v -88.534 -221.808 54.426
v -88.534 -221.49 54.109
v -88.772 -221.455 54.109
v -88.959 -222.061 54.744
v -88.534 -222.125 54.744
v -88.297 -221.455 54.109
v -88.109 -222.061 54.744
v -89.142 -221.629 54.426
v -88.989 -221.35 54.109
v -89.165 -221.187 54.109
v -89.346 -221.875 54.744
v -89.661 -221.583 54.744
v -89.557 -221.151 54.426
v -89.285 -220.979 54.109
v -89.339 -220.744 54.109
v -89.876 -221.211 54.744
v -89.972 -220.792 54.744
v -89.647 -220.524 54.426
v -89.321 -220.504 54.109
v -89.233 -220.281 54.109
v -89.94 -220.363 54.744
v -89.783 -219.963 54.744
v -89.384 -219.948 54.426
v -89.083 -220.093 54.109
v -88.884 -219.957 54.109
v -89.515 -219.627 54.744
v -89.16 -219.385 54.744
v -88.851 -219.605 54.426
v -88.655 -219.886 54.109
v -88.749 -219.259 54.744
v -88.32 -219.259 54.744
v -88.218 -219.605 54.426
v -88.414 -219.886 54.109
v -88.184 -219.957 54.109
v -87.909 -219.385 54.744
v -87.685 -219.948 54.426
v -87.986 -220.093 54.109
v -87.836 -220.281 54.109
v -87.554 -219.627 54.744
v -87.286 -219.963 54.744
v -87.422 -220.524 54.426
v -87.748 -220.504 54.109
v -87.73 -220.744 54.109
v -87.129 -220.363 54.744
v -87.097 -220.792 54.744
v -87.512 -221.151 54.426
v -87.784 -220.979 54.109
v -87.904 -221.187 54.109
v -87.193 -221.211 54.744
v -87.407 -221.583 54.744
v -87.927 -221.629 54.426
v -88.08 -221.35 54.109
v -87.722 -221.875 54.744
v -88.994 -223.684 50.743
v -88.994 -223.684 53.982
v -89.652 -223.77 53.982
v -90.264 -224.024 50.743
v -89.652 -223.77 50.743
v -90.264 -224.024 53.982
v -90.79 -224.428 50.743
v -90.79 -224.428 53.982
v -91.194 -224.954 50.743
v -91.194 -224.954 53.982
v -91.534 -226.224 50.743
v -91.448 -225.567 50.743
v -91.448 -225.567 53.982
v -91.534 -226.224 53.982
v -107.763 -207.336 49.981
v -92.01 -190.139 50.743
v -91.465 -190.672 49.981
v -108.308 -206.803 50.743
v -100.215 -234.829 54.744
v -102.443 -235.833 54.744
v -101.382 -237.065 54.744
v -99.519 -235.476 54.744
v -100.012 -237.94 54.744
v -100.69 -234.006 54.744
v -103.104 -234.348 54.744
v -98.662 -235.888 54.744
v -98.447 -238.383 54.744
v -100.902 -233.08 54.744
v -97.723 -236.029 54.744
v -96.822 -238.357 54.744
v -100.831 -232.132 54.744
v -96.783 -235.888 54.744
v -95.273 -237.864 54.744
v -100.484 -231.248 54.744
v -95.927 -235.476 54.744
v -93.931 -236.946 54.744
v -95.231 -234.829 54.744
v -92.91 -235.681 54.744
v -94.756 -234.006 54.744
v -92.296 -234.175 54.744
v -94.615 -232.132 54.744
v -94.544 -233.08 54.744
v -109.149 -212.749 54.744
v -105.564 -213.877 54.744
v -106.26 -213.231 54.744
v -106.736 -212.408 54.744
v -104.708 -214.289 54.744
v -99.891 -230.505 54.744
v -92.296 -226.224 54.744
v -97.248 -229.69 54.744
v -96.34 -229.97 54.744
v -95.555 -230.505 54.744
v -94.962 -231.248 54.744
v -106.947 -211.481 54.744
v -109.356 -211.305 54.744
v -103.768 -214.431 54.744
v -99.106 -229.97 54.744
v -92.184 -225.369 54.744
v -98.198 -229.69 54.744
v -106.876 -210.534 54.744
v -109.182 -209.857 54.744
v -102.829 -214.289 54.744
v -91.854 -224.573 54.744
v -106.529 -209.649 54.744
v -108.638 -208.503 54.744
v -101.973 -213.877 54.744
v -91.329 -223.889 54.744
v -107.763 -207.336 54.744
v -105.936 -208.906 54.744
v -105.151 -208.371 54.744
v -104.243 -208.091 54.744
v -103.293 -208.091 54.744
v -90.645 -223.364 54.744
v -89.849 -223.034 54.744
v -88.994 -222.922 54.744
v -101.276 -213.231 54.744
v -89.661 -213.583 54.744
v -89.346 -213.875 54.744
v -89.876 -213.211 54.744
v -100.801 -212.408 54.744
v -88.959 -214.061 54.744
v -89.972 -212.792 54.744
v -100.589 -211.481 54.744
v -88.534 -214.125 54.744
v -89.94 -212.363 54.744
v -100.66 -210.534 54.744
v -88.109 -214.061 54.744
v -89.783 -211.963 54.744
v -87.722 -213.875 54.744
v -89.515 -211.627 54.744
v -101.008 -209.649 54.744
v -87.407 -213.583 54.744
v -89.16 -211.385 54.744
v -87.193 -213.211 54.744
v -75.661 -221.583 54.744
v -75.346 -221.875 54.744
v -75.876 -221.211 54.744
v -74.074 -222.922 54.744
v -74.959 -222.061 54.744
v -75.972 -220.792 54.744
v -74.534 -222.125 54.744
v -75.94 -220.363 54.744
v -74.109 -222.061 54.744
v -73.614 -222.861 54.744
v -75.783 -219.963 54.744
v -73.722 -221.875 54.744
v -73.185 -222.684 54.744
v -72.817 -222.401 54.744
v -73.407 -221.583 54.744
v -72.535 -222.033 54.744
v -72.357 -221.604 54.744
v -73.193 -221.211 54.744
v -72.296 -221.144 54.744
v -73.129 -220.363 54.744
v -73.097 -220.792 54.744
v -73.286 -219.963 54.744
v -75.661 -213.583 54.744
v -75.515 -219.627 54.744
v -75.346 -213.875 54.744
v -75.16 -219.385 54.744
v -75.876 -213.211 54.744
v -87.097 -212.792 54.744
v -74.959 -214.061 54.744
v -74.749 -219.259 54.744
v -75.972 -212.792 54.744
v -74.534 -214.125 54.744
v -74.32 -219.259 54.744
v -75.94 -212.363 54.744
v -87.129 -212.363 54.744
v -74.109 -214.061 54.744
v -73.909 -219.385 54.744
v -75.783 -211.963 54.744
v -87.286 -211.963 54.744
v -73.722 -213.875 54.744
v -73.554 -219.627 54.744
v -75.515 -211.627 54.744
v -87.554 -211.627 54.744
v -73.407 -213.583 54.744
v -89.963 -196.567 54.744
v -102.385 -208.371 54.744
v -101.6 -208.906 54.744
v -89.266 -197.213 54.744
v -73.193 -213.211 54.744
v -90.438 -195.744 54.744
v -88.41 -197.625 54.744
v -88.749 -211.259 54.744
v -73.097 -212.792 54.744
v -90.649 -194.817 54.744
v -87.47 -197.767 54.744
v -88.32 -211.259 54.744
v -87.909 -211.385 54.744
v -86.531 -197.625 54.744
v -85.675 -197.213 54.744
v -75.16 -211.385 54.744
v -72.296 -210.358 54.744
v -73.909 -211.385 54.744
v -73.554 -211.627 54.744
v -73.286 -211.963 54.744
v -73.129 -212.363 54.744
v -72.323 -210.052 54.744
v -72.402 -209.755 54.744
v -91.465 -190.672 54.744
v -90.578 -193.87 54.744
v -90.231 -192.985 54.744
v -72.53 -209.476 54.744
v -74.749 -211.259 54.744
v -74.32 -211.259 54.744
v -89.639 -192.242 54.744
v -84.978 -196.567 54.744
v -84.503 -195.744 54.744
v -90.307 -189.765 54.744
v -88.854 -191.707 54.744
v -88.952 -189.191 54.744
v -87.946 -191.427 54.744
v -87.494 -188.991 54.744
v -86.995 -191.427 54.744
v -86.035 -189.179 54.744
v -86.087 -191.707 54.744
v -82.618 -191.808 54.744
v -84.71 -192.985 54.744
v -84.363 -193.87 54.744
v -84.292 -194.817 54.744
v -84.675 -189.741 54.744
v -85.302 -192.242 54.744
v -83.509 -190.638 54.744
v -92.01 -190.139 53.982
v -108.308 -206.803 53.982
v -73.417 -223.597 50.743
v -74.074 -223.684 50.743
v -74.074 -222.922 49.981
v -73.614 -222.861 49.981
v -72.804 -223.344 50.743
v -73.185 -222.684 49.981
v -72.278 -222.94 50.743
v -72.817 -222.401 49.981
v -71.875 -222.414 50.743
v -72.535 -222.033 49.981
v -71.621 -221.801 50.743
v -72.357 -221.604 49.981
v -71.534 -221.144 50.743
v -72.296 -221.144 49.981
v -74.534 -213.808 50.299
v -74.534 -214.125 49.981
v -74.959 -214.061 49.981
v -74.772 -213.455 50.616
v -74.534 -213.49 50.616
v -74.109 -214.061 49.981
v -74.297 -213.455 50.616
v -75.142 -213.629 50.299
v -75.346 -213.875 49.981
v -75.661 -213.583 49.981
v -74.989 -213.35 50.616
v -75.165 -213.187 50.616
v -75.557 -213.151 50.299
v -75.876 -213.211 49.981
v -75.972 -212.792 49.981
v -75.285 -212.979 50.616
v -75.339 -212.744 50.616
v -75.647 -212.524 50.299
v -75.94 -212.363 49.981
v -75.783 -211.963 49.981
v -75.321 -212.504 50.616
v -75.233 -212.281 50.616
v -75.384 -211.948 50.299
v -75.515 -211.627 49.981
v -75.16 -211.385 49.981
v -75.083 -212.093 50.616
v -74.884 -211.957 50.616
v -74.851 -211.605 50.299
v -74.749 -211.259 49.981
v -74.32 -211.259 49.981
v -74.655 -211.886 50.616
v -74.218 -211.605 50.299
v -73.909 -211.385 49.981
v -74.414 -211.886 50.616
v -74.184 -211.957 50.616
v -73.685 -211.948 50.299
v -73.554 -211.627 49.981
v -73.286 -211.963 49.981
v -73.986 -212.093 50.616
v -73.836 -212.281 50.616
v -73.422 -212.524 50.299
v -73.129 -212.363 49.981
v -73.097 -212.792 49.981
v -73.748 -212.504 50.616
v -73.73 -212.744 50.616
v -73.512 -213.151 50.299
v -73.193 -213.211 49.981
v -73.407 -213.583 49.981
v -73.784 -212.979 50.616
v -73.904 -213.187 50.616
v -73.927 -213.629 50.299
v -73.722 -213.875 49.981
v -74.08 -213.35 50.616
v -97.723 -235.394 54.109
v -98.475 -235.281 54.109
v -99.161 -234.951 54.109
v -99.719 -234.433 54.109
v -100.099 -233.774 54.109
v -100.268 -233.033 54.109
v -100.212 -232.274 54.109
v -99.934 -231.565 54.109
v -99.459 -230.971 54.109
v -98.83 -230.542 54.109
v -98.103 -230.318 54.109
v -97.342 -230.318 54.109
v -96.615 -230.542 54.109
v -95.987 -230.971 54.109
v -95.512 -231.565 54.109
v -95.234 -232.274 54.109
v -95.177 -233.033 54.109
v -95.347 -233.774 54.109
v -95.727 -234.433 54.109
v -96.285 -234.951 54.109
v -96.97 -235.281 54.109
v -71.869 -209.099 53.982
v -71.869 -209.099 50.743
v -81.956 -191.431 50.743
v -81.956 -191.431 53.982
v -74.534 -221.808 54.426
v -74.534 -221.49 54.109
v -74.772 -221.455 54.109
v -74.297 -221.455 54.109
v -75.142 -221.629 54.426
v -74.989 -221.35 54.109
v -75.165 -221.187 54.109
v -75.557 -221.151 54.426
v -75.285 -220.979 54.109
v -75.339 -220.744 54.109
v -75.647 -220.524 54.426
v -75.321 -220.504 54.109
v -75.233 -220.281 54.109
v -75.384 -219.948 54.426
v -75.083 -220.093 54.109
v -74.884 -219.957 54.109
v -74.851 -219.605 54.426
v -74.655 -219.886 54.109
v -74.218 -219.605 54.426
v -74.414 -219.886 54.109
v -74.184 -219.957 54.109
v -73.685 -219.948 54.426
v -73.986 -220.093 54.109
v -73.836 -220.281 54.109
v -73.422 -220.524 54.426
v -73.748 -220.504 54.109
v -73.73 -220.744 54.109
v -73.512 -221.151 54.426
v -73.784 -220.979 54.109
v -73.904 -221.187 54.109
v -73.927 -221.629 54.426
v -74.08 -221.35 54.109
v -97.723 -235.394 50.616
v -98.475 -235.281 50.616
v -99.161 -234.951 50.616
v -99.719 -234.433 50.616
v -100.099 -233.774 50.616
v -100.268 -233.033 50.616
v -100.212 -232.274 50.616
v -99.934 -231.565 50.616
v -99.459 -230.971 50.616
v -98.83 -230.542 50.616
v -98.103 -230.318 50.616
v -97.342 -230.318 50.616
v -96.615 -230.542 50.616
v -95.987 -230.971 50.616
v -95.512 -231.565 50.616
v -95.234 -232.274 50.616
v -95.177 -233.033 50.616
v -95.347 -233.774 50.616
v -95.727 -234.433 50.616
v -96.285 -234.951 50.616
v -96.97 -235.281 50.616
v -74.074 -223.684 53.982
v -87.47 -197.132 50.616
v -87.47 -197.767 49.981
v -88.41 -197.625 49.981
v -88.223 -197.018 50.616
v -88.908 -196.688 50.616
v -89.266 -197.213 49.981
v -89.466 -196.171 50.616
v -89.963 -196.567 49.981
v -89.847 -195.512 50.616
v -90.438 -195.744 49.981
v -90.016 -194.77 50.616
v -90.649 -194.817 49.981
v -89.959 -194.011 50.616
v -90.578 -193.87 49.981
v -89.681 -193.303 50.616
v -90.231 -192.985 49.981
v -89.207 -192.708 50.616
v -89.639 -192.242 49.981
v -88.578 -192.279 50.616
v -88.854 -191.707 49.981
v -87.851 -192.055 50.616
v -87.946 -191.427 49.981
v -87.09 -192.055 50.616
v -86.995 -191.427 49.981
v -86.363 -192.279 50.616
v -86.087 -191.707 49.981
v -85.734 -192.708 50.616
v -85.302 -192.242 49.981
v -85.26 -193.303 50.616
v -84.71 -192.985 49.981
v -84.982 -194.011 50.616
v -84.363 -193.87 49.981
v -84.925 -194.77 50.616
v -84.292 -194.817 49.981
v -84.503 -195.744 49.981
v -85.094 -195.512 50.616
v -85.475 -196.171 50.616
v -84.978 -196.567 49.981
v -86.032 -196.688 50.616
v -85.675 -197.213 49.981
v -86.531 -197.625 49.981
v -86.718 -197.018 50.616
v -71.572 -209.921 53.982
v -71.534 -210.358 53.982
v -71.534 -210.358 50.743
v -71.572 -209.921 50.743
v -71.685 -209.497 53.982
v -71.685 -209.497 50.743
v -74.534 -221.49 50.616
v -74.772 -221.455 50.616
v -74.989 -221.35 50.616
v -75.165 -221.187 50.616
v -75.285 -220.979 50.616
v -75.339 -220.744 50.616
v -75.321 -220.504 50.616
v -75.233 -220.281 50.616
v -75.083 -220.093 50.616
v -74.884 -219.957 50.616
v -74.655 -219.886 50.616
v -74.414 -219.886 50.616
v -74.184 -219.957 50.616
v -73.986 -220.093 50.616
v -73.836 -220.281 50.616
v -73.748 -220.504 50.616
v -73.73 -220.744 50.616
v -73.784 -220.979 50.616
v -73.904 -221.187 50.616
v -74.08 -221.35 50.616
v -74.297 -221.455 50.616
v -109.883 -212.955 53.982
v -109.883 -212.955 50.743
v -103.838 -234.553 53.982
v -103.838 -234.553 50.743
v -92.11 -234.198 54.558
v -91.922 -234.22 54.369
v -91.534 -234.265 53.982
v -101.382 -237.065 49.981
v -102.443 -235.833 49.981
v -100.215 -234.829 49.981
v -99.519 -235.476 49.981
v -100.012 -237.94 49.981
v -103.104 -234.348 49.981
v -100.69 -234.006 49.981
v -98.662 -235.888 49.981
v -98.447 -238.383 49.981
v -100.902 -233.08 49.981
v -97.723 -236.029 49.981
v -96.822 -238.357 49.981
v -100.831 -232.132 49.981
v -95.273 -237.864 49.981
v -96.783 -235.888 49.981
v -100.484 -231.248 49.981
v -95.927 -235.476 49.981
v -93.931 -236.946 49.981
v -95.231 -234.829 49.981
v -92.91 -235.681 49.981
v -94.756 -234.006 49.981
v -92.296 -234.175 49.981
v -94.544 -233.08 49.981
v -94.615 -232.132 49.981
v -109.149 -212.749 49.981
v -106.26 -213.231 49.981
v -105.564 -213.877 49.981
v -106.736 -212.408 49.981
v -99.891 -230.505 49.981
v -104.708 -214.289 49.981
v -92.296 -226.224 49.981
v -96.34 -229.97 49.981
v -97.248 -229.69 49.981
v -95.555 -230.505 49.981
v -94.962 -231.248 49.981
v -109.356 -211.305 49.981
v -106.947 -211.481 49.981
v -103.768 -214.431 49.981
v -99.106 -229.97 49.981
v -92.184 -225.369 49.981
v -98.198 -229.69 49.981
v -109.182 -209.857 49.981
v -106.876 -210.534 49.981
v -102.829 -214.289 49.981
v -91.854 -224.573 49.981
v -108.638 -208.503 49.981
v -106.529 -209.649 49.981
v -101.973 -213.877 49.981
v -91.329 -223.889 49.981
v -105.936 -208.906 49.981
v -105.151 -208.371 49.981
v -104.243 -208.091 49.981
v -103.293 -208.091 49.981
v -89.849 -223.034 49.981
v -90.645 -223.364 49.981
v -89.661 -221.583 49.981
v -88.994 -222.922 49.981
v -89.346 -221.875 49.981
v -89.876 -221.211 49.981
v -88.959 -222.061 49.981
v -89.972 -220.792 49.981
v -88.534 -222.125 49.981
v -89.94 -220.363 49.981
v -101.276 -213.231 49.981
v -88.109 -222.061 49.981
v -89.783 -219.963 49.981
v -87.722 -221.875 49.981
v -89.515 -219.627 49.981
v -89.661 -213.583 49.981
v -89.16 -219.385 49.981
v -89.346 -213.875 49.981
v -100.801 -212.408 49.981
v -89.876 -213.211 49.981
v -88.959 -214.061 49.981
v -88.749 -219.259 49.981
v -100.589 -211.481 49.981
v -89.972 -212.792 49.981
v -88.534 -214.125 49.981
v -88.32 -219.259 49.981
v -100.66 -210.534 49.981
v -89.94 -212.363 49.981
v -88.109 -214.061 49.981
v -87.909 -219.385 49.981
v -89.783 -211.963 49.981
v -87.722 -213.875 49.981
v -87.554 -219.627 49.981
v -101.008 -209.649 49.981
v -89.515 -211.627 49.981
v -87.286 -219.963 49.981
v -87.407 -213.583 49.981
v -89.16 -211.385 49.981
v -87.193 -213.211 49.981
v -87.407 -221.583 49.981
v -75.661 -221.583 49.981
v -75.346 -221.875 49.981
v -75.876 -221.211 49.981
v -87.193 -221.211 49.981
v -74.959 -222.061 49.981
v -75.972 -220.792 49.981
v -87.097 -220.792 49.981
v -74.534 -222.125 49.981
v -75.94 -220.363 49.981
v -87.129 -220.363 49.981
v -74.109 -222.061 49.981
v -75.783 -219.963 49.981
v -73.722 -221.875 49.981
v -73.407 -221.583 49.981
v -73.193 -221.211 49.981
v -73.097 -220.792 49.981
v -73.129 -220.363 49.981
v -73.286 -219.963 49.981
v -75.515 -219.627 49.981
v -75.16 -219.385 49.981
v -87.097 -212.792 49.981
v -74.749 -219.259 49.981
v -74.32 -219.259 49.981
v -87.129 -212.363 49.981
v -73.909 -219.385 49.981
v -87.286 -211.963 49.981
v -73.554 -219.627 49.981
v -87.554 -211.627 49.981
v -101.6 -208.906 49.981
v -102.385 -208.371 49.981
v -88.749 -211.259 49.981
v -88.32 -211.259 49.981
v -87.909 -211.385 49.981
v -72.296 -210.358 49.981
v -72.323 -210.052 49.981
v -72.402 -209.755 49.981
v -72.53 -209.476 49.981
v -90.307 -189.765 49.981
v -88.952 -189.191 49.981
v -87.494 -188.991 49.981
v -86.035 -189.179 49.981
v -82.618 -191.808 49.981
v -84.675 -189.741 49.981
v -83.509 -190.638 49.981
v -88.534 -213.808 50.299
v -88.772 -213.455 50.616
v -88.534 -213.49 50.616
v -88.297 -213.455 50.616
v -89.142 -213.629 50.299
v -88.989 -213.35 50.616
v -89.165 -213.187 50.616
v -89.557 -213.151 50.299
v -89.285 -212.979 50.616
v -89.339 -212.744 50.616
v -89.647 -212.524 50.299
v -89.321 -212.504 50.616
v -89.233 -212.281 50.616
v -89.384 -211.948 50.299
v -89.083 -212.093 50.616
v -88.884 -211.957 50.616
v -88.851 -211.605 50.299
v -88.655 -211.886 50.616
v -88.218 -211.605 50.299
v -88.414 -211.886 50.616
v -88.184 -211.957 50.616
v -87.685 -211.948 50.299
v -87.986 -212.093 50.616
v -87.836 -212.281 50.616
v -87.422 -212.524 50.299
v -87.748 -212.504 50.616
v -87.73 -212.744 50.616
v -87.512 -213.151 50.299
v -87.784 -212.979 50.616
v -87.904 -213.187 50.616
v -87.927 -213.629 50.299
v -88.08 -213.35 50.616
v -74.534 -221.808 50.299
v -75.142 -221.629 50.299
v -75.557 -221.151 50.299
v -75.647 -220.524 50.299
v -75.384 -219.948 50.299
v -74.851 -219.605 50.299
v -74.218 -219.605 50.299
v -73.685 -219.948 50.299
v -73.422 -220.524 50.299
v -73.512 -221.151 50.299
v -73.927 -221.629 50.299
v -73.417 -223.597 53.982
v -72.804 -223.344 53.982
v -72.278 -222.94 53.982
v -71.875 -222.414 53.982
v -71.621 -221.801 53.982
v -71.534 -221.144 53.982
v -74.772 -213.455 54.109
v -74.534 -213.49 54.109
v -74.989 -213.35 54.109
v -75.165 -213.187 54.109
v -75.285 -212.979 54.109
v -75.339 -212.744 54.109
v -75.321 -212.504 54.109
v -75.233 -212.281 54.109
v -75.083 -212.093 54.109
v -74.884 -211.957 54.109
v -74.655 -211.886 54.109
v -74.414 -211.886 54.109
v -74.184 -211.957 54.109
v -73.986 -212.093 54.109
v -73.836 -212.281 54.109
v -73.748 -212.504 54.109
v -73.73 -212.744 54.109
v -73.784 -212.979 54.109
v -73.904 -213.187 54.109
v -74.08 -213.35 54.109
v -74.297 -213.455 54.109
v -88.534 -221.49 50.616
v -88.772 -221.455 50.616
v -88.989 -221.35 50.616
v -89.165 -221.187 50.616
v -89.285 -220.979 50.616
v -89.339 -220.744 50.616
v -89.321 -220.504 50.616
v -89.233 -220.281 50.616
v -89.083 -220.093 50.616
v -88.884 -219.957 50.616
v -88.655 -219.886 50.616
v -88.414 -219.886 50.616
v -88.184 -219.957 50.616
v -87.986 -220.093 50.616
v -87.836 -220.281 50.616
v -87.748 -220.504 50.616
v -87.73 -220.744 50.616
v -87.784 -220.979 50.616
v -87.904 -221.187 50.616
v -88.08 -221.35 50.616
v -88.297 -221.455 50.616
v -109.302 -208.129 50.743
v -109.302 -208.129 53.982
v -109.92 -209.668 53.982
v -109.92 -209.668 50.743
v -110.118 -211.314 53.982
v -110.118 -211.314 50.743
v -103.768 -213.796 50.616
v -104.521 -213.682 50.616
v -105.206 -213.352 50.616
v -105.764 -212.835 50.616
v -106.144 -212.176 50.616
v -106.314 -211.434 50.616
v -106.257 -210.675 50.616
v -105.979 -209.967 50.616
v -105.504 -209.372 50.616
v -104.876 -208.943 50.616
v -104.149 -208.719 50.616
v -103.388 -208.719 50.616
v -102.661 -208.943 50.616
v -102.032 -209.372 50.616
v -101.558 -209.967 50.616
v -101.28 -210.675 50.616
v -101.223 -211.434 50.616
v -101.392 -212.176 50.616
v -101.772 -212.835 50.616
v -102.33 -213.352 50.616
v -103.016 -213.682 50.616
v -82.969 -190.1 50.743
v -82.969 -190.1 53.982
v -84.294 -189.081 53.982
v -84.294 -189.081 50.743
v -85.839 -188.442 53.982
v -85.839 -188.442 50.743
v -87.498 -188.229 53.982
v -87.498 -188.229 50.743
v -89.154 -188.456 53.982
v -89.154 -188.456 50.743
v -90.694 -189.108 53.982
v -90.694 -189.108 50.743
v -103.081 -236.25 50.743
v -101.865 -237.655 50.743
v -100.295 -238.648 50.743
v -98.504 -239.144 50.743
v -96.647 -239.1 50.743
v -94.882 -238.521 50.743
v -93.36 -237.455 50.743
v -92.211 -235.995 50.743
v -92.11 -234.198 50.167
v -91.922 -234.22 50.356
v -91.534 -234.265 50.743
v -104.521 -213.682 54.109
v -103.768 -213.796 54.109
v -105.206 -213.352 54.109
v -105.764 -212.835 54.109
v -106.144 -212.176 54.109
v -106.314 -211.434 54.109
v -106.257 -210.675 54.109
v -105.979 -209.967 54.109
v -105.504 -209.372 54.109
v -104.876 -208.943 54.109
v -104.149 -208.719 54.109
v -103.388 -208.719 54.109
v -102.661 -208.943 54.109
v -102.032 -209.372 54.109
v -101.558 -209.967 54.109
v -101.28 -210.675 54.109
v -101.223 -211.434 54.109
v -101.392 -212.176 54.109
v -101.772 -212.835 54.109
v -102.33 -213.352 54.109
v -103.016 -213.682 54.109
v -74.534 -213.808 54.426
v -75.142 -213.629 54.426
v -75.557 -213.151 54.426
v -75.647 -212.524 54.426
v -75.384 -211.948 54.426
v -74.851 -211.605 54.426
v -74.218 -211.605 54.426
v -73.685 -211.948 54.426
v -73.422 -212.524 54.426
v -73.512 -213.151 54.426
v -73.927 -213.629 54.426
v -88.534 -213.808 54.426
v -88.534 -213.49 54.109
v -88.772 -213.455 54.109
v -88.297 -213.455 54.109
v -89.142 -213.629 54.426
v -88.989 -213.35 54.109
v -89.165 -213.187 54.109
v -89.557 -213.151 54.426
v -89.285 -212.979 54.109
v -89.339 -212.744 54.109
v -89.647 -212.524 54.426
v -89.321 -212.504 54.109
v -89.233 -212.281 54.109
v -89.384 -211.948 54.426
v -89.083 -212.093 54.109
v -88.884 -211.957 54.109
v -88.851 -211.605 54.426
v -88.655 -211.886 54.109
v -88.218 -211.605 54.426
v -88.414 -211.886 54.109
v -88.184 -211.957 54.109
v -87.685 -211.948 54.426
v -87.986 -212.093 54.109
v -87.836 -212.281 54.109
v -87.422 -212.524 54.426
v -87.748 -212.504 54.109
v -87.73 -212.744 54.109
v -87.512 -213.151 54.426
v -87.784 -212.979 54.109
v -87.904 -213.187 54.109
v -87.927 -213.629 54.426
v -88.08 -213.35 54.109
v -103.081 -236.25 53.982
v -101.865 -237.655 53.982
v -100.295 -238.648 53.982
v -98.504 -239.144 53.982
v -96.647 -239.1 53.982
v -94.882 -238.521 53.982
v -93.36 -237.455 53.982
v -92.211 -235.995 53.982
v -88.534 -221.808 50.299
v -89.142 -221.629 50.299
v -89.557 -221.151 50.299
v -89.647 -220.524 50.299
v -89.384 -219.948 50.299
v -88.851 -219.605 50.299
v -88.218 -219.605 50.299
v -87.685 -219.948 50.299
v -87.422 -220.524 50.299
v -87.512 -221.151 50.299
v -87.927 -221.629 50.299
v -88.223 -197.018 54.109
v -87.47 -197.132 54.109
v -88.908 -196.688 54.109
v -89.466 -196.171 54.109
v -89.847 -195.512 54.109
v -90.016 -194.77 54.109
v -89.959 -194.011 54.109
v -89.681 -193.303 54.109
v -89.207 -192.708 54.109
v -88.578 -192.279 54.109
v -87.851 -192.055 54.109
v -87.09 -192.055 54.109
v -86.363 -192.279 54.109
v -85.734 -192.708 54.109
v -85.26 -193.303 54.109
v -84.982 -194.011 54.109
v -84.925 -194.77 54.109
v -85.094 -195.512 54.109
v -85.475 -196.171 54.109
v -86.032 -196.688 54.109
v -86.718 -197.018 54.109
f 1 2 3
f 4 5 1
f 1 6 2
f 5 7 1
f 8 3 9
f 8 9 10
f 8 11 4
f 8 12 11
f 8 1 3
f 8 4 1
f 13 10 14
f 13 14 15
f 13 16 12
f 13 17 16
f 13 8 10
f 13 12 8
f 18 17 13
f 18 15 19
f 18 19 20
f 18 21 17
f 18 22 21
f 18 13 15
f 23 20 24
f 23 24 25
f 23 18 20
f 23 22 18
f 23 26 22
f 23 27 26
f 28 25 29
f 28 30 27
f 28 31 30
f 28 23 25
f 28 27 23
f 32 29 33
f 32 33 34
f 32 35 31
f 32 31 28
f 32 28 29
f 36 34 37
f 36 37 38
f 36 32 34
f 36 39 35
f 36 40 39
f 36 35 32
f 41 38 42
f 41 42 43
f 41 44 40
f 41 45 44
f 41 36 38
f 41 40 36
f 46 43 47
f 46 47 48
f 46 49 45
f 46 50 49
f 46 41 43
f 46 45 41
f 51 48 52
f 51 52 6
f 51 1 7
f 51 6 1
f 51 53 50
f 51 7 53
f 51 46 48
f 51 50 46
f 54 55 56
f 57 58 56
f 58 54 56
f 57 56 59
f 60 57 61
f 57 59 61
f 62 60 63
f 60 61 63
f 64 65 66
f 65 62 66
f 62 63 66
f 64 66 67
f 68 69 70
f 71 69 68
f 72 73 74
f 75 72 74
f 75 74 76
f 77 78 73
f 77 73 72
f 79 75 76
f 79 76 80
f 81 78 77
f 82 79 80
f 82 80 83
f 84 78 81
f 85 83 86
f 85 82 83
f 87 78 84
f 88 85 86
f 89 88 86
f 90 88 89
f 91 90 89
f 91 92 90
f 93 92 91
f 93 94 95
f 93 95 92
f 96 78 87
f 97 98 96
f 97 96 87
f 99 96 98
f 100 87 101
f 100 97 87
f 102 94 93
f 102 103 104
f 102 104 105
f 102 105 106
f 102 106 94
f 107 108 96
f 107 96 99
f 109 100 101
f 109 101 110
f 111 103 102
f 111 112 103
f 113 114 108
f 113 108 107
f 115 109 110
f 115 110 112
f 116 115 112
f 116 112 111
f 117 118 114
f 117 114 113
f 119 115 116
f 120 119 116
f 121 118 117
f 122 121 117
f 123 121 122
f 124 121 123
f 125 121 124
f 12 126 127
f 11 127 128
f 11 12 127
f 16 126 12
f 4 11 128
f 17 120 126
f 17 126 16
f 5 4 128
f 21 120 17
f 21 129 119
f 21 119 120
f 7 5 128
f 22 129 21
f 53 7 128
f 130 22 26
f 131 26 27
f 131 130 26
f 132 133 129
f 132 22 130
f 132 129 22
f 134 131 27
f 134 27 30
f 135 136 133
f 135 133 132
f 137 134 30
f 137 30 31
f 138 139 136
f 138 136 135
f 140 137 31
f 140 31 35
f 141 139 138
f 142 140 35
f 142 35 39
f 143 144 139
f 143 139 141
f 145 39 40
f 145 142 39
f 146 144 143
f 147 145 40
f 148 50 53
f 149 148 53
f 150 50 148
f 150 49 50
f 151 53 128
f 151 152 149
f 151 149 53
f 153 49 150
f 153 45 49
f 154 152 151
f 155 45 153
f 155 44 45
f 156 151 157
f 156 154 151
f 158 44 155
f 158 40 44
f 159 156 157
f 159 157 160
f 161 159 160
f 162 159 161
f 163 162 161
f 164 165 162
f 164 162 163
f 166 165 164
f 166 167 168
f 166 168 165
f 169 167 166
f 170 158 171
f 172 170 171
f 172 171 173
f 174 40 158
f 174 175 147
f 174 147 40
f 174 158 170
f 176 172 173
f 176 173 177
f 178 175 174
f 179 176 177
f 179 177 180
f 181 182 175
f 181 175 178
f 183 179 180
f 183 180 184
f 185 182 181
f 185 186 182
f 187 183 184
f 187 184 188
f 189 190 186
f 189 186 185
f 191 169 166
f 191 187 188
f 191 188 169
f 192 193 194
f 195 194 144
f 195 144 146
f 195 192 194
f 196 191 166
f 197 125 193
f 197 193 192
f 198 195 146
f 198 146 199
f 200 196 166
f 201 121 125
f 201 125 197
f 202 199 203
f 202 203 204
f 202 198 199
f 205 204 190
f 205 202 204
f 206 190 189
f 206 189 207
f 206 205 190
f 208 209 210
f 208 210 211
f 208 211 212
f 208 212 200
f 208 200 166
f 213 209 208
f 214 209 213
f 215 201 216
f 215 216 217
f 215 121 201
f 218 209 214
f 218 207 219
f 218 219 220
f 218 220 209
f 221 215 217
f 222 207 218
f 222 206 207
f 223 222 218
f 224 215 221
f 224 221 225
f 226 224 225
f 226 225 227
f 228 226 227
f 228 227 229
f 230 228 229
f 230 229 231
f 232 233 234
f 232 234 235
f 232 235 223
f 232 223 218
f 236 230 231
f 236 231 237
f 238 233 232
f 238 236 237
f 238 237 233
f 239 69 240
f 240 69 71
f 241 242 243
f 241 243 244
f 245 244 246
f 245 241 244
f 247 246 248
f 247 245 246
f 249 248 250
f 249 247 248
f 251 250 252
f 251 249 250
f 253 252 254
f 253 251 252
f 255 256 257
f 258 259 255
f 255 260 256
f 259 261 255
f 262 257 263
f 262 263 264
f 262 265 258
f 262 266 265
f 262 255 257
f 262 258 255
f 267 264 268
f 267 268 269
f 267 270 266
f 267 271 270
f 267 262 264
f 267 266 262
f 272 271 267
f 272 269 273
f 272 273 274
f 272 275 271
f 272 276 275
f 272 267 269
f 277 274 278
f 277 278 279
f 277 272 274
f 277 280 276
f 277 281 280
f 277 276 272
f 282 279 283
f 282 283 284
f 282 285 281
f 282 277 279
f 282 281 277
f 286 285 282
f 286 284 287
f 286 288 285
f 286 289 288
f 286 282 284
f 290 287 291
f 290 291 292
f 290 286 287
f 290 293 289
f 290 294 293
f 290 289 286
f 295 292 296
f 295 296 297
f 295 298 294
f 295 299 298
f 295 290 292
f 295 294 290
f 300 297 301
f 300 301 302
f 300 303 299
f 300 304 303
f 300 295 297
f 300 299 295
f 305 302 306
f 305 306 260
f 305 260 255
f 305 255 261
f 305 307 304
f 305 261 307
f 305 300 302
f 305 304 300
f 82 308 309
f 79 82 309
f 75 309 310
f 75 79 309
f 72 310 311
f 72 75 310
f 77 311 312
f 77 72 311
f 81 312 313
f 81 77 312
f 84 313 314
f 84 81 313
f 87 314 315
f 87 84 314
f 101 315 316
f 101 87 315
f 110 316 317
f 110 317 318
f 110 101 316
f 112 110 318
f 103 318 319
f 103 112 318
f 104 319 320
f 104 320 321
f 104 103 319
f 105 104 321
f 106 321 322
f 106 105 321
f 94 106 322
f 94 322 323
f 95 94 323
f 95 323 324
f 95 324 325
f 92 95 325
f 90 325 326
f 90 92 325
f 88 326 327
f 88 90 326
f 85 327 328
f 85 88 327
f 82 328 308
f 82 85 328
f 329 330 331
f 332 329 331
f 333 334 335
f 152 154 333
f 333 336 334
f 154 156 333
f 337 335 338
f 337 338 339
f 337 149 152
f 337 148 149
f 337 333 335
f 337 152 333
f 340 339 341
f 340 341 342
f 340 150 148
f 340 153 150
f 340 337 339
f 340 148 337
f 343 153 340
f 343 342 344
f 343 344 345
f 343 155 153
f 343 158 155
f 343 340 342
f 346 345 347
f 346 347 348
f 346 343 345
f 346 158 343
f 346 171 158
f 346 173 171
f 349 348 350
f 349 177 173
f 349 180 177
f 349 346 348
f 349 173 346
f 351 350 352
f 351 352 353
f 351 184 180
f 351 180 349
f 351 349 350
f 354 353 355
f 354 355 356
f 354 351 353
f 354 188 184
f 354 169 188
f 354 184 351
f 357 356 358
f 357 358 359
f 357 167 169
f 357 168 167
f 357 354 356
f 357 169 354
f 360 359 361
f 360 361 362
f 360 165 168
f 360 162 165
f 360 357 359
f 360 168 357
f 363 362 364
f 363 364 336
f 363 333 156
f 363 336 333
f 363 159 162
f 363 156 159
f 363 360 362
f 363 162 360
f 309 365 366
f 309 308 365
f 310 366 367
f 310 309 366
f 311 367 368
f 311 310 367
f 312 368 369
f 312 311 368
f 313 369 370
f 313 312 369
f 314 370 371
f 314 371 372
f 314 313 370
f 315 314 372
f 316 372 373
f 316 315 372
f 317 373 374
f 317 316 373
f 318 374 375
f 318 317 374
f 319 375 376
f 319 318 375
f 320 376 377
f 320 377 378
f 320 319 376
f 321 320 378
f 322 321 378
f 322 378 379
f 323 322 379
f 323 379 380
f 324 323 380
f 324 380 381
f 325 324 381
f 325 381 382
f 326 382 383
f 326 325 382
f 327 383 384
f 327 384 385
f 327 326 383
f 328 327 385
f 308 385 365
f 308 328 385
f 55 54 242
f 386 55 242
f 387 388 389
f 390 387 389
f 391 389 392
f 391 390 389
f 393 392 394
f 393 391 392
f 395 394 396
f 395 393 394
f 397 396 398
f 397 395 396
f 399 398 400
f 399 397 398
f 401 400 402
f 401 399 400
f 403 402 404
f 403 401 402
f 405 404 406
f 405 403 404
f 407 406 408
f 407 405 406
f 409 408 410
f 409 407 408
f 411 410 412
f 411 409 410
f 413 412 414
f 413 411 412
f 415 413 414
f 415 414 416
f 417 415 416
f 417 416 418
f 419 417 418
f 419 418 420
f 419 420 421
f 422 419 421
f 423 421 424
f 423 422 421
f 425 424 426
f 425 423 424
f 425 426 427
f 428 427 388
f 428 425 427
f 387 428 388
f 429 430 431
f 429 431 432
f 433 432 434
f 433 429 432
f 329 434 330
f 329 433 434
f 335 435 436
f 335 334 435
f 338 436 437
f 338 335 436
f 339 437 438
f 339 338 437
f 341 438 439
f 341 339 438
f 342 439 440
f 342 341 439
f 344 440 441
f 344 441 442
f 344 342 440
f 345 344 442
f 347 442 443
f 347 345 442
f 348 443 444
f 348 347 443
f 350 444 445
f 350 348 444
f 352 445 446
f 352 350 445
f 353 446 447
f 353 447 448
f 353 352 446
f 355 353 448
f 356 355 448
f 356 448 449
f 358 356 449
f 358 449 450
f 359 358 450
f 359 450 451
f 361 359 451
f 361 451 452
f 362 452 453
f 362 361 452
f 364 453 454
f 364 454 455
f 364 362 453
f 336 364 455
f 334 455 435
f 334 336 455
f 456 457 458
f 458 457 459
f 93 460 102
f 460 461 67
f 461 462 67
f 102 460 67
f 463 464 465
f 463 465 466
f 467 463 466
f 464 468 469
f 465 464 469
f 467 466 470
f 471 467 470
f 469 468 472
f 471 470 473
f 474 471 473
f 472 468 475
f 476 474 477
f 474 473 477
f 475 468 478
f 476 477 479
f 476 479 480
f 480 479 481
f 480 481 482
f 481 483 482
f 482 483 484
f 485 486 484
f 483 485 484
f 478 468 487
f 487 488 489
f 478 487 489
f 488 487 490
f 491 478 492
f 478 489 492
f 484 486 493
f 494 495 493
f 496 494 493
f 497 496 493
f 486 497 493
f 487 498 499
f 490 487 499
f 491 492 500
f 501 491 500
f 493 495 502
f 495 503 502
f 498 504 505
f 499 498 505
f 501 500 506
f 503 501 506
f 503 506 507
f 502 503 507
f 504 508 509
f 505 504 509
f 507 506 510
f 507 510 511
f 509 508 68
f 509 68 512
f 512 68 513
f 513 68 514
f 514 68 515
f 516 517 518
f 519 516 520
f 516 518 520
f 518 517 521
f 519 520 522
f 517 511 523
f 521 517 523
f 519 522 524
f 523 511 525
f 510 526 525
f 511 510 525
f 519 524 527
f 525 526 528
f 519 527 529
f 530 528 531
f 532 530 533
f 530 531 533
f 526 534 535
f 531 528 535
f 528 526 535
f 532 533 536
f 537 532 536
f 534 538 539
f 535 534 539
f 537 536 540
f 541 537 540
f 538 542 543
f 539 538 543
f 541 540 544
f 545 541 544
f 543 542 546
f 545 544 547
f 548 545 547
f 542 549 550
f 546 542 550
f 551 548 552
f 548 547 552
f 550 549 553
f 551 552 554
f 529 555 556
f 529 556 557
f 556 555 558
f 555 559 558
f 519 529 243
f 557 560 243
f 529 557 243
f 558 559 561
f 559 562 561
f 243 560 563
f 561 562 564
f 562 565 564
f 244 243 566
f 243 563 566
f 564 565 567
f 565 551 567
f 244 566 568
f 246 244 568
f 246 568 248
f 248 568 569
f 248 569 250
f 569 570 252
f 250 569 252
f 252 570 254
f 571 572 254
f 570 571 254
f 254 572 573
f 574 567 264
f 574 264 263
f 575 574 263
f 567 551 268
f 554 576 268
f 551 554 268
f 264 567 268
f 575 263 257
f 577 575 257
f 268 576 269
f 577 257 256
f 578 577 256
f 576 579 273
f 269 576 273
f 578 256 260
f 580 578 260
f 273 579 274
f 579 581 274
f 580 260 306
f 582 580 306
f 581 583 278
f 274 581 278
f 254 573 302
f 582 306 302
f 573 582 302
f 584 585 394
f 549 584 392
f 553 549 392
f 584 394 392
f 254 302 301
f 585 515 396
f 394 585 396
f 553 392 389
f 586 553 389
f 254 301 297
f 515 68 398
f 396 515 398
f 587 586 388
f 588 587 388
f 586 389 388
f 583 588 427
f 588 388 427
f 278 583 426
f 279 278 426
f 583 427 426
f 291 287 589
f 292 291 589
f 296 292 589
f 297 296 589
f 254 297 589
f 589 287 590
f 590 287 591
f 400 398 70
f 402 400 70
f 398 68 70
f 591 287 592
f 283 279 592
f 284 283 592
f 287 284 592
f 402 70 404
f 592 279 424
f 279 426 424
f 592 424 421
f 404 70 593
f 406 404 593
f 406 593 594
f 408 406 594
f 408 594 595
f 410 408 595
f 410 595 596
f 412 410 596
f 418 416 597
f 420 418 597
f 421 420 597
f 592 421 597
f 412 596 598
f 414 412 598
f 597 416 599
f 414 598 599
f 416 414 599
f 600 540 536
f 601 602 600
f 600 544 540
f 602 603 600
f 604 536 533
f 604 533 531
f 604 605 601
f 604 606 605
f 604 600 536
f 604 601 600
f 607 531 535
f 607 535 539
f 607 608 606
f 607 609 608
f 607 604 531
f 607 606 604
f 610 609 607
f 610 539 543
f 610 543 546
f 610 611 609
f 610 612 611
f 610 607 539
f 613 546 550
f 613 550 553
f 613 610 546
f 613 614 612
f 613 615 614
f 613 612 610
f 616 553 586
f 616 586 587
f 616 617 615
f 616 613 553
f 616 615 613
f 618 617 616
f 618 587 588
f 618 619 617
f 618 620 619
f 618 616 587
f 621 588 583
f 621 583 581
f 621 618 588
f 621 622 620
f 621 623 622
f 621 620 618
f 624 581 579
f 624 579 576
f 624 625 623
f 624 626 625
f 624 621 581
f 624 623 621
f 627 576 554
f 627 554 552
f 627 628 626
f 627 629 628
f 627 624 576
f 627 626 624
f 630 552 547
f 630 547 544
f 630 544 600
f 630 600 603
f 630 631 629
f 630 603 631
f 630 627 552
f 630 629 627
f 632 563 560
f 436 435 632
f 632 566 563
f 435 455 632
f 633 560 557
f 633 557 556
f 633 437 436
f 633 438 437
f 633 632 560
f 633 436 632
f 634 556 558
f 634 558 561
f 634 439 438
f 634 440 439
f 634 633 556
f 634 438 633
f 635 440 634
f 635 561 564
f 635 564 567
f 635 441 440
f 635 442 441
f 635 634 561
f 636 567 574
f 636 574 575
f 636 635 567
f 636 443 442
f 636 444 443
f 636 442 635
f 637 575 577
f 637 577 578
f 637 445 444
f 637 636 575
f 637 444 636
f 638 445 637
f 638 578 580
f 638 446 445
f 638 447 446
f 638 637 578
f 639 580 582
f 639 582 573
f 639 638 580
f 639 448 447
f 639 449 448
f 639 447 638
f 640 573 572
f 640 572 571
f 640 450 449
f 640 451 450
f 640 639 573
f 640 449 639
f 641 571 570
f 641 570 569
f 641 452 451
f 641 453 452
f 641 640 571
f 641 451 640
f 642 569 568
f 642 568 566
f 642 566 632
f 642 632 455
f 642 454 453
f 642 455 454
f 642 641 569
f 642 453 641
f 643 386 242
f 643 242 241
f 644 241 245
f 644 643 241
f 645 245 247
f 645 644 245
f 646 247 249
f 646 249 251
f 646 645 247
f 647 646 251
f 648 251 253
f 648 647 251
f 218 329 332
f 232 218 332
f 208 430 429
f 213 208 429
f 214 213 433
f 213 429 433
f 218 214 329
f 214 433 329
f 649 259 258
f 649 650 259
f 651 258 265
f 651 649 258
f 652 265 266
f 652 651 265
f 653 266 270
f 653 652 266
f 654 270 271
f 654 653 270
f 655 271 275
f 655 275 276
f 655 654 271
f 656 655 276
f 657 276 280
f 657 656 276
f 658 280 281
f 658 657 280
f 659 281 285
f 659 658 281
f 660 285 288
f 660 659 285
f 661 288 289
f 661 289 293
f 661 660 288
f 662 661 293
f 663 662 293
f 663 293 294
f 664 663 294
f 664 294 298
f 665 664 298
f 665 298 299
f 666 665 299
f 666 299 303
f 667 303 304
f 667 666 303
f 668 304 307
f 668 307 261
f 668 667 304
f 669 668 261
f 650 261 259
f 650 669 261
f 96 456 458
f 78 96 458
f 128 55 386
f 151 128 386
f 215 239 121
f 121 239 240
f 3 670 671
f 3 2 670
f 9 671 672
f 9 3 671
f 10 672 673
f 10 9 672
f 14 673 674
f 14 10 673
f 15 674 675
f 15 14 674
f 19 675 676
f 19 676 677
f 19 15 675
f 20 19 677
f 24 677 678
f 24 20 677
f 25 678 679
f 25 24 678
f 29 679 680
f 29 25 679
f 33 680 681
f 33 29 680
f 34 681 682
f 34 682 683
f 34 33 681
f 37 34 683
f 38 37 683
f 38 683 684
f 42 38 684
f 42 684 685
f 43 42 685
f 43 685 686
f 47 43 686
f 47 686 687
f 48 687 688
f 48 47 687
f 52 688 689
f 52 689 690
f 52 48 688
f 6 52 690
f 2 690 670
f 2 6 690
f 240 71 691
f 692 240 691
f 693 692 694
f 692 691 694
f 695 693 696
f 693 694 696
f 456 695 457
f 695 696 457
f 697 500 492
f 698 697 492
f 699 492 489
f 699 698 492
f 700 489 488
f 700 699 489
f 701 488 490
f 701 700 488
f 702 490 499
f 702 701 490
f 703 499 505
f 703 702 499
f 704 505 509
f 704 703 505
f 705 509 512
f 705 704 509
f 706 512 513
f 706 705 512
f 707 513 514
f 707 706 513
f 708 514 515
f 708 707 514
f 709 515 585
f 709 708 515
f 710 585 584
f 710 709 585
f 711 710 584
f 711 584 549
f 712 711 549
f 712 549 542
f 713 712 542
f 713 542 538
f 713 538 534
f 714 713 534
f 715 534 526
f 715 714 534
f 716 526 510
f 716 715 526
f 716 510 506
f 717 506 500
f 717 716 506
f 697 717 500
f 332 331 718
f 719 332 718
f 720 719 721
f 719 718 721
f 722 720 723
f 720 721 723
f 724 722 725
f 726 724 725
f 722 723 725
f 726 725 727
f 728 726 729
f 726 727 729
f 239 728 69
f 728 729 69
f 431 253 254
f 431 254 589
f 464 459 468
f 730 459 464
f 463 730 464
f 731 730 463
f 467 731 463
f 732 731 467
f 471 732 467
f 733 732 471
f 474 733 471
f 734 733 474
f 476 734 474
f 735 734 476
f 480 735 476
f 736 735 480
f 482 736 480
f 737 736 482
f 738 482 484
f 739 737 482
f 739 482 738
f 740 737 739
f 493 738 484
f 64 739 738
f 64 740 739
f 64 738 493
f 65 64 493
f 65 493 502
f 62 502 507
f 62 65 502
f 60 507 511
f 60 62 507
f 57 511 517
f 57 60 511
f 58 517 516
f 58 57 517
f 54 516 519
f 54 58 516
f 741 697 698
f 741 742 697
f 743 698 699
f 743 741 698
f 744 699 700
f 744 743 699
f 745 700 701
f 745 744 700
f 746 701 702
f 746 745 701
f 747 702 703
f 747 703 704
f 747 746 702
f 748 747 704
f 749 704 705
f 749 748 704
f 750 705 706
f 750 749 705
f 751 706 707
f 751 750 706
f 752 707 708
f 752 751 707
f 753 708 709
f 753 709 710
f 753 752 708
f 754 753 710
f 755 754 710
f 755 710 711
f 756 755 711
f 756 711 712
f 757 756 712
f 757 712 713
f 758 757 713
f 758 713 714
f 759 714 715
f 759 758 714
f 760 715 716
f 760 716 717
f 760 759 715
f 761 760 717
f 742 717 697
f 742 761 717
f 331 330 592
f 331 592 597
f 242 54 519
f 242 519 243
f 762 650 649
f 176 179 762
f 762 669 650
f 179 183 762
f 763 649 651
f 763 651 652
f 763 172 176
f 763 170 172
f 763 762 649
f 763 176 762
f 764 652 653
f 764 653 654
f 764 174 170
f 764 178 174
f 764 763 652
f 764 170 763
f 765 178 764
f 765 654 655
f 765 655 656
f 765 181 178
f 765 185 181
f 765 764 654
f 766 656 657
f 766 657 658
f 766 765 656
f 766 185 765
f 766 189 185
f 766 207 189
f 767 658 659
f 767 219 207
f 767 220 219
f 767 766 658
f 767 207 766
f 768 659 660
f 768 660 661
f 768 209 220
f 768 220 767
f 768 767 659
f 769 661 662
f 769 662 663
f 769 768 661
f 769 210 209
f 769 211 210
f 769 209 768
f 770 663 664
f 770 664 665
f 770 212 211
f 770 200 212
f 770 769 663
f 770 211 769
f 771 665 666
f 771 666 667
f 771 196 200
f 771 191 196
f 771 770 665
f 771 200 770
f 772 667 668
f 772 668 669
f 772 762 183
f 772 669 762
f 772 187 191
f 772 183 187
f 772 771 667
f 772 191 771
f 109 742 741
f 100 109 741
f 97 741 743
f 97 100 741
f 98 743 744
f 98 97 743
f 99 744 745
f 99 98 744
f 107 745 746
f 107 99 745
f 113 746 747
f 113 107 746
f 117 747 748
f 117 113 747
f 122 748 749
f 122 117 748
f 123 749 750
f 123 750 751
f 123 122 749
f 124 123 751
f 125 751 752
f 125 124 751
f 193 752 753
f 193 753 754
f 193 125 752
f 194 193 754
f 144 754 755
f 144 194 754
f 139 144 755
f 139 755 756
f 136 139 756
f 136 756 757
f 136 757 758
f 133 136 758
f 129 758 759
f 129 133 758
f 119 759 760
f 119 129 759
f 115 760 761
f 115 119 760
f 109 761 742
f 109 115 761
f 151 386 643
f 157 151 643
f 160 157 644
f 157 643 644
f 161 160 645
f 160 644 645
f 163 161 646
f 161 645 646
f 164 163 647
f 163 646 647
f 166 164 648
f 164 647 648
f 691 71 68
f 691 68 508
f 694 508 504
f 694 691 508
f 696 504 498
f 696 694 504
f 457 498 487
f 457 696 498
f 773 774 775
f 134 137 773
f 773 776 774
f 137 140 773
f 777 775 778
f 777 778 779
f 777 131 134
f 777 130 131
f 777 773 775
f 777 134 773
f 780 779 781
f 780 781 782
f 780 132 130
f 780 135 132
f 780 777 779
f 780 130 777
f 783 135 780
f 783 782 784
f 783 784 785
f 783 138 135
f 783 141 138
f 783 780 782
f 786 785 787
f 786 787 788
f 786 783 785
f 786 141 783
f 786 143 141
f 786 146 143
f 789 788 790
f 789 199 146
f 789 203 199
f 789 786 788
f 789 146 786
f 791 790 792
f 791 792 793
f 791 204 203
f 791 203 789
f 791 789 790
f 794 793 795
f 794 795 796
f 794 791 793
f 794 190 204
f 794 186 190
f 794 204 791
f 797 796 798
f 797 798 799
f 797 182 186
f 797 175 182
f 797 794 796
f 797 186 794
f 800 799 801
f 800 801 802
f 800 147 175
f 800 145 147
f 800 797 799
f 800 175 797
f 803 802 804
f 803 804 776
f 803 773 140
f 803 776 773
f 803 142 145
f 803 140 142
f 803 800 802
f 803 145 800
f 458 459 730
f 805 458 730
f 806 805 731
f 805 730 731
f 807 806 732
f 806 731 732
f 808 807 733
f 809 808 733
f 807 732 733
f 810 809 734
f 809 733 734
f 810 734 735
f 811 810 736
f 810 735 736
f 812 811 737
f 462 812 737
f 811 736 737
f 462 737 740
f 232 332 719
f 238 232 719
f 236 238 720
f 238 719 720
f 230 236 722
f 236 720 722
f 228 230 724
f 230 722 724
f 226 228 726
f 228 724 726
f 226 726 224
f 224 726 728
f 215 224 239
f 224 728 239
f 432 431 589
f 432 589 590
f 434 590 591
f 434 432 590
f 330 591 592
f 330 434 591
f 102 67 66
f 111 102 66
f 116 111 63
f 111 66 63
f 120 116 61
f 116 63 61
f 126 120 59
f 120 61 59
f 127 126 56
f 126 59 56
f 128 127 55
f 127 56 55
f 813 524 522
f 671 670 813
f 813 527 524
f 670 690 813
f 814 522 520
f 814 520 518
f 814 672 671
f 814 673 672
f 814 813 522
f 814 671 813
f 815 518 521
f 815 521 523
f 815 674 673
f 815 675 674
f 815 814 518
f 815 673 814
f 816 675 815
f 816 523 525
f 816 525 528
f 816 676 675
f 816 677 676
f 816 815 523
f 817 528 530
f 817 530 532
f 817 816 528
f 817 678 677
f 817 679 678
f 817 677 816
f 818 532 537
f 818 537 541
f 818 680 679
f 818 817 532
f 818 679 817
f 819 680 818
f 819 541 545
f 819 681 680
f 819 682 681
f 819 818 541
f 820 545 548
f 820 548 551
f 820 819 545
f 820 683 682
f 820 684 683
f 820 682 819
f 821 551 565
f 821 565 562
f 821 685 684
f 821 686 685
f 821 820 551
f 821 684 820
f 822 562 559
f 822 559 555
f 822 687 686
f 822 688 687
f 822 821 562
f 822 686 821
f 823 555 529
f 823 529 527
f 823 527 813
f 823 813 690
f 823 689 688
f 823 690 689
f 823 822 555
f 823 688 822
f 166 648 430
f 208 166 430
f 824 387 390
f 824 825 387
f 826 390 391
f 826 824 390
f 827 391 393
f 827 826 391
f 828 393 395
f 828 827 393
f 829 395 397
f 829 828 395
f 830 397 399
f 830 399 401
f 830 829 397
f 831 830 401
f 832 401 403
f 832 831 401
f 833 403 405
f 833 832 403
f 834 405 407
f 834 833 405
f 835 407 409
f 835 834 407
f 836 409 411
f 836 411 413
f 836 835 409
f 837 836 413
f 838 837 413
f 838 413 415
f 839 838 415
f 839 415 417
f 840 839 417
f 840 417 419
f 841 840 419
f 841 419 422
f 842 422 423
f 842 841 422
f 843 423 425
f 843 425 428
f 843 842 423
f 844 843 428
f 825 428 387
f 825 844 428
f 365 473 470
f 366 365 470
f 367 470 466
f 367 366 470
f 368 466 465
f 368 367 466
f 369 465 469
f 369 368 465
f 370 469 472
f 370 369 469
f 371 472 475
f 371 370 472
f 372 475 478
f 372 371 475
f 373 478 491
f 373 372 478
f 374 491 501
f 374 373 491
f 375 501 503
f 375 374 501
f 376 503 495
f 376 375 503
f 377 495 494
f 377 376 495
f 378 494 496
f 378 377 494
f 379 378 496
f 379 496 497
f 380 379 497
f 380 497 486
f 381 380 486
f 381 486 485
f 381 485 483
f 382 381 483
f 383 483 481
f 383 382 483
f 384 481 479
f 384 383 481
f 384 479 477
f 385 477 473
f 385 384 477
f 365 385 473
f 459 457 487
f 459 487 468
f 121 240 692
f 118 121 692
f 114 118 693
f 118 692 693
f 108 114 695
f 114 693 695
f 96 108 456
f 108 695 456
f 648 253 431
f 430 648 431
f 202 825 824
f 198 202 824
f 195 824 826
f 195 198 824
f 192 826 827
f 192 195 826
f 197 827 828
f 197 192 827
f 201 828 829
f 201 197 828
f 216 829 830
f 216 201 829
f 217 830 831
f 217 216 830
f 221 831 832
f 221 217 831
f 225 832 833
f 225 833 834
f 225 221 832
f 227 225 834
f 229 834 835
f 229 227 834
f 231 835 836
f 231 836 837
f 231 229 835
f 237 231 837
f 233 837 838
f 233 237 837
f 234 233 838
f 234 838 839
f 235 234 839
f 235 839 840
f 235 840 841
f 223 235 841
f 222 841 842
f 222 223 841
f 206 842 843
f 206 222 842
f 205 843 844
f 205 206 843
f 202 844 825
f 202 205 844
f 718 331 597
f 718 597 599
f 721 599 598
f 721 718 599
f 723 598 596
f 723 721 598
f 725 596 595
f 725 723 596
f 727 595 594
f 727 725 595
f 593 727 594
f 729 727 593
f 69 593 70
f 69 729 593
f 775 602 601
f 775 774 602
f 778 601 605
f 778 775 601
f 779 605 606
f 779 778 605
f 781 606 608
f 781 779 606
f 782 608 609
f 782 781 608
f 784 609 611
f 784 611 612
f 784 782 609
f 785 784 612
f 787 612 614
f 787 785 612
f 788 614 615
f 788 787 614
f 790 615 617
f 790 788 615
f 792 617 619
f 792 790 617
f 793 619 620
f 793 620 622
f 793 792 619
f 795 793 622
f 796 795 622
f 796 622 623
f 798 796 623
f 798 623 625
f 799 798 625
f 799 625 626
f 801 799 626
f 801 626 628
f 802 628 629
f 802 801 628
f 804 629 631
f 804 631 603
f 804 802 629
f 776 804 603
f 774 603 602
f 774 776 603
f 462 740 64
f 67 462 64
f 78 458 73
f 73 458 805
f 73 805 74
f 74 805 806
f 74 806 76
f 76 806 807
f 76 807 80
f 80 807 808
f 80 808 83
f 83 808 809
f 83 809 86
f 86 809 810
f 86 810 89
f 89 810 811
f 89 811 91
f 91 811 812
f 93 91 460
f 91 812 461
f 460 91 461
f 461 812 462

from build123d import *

# Parameters (mm, degrees)
BOSS_EXTRUDE1_DEPTH                   = 4.7625
F_10_CLEARANCE_HOLE1_AT_2_COUNT       = 2
F_10_CLEARANCE_HOLE1_AT_2_PITCH       = 39.612434438
F_10_CLEARANCE_HOLE1_AT_3_COUNT       = 2
F_10_CLEARANCE_HOLE1_AT_3_PITCH       = 22.428811893
FILLET1_R                             = 2.54
F_52_0_0635_DIAMETER_HOLE1_AT_2_COUNT = 2
F_52_0_0635_DIAMETER_HOLE1_AT_2_PITCH = 14
F_52_0_0635_DIAMETER_HOLE1_AT_3_COUNT = 2
F_52_0_0635_DIAMETER_HOLE1_AT_3_PITCH = 16.124515497
F_52_0_0635_DIAMETER_HOLE1_AT_4_COUNT = 2
F_52_0_0635_DIAMETER_HOLE1_AT_4_PITCH = 8
CHAMFER4_SIZE                         = 0.762


with BuildPart() as part:
    # Sketch2 → Boss-Extrude1 (new body)
    with BuildSketch(Plane.XY.offset(49.981386822)):
        with BuildLine():
            Line((-91.534347313, -223.683915635), (-71.534347313, -223.683915635))
            Line((-71.534347313, -223.683915635), (-71.534347313, -209.683915635))
            Line((-71.534347313, -209.683915635), (-81.955963126, -191.43064496))
            ThreePointArc((-81.955963126, -191.43064496), (-86.661422004, -188.280866285), (-92.010183842, -190.139143919))
            Line((-92.010183842, -190.139143919), (-108.307938293, -206.803069118))
            ThreePointArc((-108.307938293, -206.803069118), (-109.919716645, -209.667777106), (-109.883203649, -212.954576174))
            Line((-109.883203649, -212.954576174), (-103.837901654, -234.553324441))
            ThreePointArc((-103.837901654, -234.553324441), (-97.573904916, -239.190042315), (-91.534347313, -234.264542164))
            Line((-91.534347313, -234.264542164), (-91.534347313, -223.683915635))
        make_face()
    extrude(amount=BOSS_EXTRUDE1_DEPTH)

    # Sketch7 → #10 Clearance Hole1 (revolve, cut)
    with BuildSketch(Plane(origin=(-97.722907594, -232.841790729, 54.743886822), x_dir=(0, -1, 0), z_dir=(1, 0, 0))):
        Polygon((0, 0), (0, 4.7625), (3.1877, 4.7625), (2.5527, 4.1275), (2.5527, 0.635), (3.1877, 0), align=None)
    f_10_clearance_hole1 = revolve(axis=Axis((-97.722907594, -232.841790729, 61.093886822), (0, 0, -1)), mode=Mode.SUBTRACT)

    # #10 Clearance Hole1 at 2: #10 Clearance Hole1 ×2
    with Locations(*[Vector(0.25881904510252135, 0.9659258262890682, 0) * (i * F_10_CLEARANCE_HOLE1_AT_2_PITCH) for i in range(1, F_10_CLEARANCE_HOLE1_AT_2_COUNT)]):
        add(f_10_clearance_hole1, mode=Mode.SUBTRACT)

    # #10 Clearance Hole1 at 3: #10 Clearance Hole1 ×2
    with Locations(*[Vector(-0.2695328680059712, 0.9629911905435459, 0) * (i * F_10_CLEARANCE_HOLE1_AT_3_PITCH) for i in range(1, F_10_CLEARANCE_HOLE1_AT_3_COUNT)]):
        add(f_10_clearance_hole1, mode=Mode.SUBTRACT)

    # Fillet1
    fillet1_edges = [part.edges().sort_by_distance(p)[0] for p in [
        (-71.534347313, -209.683915635, 52.362636822),
        (-71.534347313, -223.683915635, 52.362636822),
        (-91.534347313, -223.683915635, 52.362636822),
    ]]
    fillet(fillet1_edges, radius=FILLET1_R)

    # Sketch9 → #52 (0.0635) Diameter Hole1 (revolve, cut)
    with BuildSketch(Plane(origin=(-88.534347313, -212.683915635, 54.743886822), x_dir=(0, -1, 0), z_dir=(1, 0, 0))):
        Polygon((0, 0), (0, 4.7625), (1.44145, 4.7625), (0.80645, 4.1275), (0.80645, 0.635), (1.44145, 0), align=None)
    f_52_0_0635_diameter_hole1 = revolve(axis=Axis((-88.534347313, -212.683915635, 61.093886822), (0, 0, -1)), mode=Mode.SUBTRACT)

    # #52 (0.0635) Diameter Hole1 at 2: #52 (0.0635) Diameter Hole1 ×2
    with Locations(*[(i * F_52_0_0635_DIAMETER_HOLE1_AT_2_PITCH, 0, 0) for i in range(1, F_52_0_0635_DIAMETER_HOLE1_AT_2_COUNT)]):
        add(f_52_0_0635_diameter_hole1, mode=Mode.SUBTRACT)

    # #52 (0.0635) Diameter Hole1 at 3: #52 (0.0635) Diameter Hole1 ×2
    with Locations(*[Vector(0.86824314212446, -0.49613893835683254, 0) * (i * F_52_0_0635_DIAMETER_HOLE1_AT_3_PITCH) for i in range(1, F_52_0_0635_DIAMETER_HOLE1_AT_3_COUNT)]):
        add(f_52_0_0635_diameter_hole1, mode=Mode.SUBTRACT)

    # #52 (0.0635) Diameter Hole1 at 4: #52 (0.0635) Diameter Hole1 ×2
    with Locations(*[(0, -i * F_52_0_0635_DIAMETER_HOLE1_AT_4_PITCH, 0) for i in range(1, F_52_0_0635_DIAMETER_HOLE1_AT_4_COUNT)]):
        add(f_52_0_0635_diameter_hole1, mode=Mode.SUBTRACT)

    # Chamfer4
    chamfer4_edges = [part.edges().sort_by_distance(p)[0] for p in [
        (-97.573904916, -239.190042315, 49.981386822),
        (-106.860552651, -223.753950307, 49.981386822),
        (-109.919716645, -209.667777106, 49.981386822),
        (-100.159061068, -198.471106519, 49.981386822),
        (-86.661422004, -188.280866285, 49.981386822),
        (-86.661422004, -188.280866285, 54.743886822),
        (-100.159061068, -198.471106519, 54.743886822),
        (-109.919716645, -209.667777106, 54.743886822),
        (-106.860552651, -223.753950307, 54.743886822),
        (-97.573904916, -239.190042315, 54.743886822),
        (-76.912256817, -200.264604887, 49.981386822),
        (-76.912256817, -200.264604887, 54.743886822),
        (-91.534347313, -230.2442289, 49.981386822),
        (-71.534347313, -215.750934685, 49.981386822),
        (-81.534347313, -223.683915635, 49.981386822),
        (-72.278296088, -222.939966859, 49.981386822),
        (-71.619319422, -209.706464627, 49.981386822),
        (-71.534347313, -215.750934685, 54.743886822),
        (-91.534347313, -230.2442289, 54.743886822),
        (-81.534347313, -223.683915635, 54.743886822),
        (-72.278296088, -222.939966859, 54.743886822),
        (-71.619319422, -209.706464627, 54.743886822),
        (-90.790398537, -224.427864411, 49.981386822),
        (-90.790398537, -224.427864411, 54.743886822),
    ]]
    chamfer(chamfer4_edges, length=CHAMFER4_SIZE)


solid = part.part
